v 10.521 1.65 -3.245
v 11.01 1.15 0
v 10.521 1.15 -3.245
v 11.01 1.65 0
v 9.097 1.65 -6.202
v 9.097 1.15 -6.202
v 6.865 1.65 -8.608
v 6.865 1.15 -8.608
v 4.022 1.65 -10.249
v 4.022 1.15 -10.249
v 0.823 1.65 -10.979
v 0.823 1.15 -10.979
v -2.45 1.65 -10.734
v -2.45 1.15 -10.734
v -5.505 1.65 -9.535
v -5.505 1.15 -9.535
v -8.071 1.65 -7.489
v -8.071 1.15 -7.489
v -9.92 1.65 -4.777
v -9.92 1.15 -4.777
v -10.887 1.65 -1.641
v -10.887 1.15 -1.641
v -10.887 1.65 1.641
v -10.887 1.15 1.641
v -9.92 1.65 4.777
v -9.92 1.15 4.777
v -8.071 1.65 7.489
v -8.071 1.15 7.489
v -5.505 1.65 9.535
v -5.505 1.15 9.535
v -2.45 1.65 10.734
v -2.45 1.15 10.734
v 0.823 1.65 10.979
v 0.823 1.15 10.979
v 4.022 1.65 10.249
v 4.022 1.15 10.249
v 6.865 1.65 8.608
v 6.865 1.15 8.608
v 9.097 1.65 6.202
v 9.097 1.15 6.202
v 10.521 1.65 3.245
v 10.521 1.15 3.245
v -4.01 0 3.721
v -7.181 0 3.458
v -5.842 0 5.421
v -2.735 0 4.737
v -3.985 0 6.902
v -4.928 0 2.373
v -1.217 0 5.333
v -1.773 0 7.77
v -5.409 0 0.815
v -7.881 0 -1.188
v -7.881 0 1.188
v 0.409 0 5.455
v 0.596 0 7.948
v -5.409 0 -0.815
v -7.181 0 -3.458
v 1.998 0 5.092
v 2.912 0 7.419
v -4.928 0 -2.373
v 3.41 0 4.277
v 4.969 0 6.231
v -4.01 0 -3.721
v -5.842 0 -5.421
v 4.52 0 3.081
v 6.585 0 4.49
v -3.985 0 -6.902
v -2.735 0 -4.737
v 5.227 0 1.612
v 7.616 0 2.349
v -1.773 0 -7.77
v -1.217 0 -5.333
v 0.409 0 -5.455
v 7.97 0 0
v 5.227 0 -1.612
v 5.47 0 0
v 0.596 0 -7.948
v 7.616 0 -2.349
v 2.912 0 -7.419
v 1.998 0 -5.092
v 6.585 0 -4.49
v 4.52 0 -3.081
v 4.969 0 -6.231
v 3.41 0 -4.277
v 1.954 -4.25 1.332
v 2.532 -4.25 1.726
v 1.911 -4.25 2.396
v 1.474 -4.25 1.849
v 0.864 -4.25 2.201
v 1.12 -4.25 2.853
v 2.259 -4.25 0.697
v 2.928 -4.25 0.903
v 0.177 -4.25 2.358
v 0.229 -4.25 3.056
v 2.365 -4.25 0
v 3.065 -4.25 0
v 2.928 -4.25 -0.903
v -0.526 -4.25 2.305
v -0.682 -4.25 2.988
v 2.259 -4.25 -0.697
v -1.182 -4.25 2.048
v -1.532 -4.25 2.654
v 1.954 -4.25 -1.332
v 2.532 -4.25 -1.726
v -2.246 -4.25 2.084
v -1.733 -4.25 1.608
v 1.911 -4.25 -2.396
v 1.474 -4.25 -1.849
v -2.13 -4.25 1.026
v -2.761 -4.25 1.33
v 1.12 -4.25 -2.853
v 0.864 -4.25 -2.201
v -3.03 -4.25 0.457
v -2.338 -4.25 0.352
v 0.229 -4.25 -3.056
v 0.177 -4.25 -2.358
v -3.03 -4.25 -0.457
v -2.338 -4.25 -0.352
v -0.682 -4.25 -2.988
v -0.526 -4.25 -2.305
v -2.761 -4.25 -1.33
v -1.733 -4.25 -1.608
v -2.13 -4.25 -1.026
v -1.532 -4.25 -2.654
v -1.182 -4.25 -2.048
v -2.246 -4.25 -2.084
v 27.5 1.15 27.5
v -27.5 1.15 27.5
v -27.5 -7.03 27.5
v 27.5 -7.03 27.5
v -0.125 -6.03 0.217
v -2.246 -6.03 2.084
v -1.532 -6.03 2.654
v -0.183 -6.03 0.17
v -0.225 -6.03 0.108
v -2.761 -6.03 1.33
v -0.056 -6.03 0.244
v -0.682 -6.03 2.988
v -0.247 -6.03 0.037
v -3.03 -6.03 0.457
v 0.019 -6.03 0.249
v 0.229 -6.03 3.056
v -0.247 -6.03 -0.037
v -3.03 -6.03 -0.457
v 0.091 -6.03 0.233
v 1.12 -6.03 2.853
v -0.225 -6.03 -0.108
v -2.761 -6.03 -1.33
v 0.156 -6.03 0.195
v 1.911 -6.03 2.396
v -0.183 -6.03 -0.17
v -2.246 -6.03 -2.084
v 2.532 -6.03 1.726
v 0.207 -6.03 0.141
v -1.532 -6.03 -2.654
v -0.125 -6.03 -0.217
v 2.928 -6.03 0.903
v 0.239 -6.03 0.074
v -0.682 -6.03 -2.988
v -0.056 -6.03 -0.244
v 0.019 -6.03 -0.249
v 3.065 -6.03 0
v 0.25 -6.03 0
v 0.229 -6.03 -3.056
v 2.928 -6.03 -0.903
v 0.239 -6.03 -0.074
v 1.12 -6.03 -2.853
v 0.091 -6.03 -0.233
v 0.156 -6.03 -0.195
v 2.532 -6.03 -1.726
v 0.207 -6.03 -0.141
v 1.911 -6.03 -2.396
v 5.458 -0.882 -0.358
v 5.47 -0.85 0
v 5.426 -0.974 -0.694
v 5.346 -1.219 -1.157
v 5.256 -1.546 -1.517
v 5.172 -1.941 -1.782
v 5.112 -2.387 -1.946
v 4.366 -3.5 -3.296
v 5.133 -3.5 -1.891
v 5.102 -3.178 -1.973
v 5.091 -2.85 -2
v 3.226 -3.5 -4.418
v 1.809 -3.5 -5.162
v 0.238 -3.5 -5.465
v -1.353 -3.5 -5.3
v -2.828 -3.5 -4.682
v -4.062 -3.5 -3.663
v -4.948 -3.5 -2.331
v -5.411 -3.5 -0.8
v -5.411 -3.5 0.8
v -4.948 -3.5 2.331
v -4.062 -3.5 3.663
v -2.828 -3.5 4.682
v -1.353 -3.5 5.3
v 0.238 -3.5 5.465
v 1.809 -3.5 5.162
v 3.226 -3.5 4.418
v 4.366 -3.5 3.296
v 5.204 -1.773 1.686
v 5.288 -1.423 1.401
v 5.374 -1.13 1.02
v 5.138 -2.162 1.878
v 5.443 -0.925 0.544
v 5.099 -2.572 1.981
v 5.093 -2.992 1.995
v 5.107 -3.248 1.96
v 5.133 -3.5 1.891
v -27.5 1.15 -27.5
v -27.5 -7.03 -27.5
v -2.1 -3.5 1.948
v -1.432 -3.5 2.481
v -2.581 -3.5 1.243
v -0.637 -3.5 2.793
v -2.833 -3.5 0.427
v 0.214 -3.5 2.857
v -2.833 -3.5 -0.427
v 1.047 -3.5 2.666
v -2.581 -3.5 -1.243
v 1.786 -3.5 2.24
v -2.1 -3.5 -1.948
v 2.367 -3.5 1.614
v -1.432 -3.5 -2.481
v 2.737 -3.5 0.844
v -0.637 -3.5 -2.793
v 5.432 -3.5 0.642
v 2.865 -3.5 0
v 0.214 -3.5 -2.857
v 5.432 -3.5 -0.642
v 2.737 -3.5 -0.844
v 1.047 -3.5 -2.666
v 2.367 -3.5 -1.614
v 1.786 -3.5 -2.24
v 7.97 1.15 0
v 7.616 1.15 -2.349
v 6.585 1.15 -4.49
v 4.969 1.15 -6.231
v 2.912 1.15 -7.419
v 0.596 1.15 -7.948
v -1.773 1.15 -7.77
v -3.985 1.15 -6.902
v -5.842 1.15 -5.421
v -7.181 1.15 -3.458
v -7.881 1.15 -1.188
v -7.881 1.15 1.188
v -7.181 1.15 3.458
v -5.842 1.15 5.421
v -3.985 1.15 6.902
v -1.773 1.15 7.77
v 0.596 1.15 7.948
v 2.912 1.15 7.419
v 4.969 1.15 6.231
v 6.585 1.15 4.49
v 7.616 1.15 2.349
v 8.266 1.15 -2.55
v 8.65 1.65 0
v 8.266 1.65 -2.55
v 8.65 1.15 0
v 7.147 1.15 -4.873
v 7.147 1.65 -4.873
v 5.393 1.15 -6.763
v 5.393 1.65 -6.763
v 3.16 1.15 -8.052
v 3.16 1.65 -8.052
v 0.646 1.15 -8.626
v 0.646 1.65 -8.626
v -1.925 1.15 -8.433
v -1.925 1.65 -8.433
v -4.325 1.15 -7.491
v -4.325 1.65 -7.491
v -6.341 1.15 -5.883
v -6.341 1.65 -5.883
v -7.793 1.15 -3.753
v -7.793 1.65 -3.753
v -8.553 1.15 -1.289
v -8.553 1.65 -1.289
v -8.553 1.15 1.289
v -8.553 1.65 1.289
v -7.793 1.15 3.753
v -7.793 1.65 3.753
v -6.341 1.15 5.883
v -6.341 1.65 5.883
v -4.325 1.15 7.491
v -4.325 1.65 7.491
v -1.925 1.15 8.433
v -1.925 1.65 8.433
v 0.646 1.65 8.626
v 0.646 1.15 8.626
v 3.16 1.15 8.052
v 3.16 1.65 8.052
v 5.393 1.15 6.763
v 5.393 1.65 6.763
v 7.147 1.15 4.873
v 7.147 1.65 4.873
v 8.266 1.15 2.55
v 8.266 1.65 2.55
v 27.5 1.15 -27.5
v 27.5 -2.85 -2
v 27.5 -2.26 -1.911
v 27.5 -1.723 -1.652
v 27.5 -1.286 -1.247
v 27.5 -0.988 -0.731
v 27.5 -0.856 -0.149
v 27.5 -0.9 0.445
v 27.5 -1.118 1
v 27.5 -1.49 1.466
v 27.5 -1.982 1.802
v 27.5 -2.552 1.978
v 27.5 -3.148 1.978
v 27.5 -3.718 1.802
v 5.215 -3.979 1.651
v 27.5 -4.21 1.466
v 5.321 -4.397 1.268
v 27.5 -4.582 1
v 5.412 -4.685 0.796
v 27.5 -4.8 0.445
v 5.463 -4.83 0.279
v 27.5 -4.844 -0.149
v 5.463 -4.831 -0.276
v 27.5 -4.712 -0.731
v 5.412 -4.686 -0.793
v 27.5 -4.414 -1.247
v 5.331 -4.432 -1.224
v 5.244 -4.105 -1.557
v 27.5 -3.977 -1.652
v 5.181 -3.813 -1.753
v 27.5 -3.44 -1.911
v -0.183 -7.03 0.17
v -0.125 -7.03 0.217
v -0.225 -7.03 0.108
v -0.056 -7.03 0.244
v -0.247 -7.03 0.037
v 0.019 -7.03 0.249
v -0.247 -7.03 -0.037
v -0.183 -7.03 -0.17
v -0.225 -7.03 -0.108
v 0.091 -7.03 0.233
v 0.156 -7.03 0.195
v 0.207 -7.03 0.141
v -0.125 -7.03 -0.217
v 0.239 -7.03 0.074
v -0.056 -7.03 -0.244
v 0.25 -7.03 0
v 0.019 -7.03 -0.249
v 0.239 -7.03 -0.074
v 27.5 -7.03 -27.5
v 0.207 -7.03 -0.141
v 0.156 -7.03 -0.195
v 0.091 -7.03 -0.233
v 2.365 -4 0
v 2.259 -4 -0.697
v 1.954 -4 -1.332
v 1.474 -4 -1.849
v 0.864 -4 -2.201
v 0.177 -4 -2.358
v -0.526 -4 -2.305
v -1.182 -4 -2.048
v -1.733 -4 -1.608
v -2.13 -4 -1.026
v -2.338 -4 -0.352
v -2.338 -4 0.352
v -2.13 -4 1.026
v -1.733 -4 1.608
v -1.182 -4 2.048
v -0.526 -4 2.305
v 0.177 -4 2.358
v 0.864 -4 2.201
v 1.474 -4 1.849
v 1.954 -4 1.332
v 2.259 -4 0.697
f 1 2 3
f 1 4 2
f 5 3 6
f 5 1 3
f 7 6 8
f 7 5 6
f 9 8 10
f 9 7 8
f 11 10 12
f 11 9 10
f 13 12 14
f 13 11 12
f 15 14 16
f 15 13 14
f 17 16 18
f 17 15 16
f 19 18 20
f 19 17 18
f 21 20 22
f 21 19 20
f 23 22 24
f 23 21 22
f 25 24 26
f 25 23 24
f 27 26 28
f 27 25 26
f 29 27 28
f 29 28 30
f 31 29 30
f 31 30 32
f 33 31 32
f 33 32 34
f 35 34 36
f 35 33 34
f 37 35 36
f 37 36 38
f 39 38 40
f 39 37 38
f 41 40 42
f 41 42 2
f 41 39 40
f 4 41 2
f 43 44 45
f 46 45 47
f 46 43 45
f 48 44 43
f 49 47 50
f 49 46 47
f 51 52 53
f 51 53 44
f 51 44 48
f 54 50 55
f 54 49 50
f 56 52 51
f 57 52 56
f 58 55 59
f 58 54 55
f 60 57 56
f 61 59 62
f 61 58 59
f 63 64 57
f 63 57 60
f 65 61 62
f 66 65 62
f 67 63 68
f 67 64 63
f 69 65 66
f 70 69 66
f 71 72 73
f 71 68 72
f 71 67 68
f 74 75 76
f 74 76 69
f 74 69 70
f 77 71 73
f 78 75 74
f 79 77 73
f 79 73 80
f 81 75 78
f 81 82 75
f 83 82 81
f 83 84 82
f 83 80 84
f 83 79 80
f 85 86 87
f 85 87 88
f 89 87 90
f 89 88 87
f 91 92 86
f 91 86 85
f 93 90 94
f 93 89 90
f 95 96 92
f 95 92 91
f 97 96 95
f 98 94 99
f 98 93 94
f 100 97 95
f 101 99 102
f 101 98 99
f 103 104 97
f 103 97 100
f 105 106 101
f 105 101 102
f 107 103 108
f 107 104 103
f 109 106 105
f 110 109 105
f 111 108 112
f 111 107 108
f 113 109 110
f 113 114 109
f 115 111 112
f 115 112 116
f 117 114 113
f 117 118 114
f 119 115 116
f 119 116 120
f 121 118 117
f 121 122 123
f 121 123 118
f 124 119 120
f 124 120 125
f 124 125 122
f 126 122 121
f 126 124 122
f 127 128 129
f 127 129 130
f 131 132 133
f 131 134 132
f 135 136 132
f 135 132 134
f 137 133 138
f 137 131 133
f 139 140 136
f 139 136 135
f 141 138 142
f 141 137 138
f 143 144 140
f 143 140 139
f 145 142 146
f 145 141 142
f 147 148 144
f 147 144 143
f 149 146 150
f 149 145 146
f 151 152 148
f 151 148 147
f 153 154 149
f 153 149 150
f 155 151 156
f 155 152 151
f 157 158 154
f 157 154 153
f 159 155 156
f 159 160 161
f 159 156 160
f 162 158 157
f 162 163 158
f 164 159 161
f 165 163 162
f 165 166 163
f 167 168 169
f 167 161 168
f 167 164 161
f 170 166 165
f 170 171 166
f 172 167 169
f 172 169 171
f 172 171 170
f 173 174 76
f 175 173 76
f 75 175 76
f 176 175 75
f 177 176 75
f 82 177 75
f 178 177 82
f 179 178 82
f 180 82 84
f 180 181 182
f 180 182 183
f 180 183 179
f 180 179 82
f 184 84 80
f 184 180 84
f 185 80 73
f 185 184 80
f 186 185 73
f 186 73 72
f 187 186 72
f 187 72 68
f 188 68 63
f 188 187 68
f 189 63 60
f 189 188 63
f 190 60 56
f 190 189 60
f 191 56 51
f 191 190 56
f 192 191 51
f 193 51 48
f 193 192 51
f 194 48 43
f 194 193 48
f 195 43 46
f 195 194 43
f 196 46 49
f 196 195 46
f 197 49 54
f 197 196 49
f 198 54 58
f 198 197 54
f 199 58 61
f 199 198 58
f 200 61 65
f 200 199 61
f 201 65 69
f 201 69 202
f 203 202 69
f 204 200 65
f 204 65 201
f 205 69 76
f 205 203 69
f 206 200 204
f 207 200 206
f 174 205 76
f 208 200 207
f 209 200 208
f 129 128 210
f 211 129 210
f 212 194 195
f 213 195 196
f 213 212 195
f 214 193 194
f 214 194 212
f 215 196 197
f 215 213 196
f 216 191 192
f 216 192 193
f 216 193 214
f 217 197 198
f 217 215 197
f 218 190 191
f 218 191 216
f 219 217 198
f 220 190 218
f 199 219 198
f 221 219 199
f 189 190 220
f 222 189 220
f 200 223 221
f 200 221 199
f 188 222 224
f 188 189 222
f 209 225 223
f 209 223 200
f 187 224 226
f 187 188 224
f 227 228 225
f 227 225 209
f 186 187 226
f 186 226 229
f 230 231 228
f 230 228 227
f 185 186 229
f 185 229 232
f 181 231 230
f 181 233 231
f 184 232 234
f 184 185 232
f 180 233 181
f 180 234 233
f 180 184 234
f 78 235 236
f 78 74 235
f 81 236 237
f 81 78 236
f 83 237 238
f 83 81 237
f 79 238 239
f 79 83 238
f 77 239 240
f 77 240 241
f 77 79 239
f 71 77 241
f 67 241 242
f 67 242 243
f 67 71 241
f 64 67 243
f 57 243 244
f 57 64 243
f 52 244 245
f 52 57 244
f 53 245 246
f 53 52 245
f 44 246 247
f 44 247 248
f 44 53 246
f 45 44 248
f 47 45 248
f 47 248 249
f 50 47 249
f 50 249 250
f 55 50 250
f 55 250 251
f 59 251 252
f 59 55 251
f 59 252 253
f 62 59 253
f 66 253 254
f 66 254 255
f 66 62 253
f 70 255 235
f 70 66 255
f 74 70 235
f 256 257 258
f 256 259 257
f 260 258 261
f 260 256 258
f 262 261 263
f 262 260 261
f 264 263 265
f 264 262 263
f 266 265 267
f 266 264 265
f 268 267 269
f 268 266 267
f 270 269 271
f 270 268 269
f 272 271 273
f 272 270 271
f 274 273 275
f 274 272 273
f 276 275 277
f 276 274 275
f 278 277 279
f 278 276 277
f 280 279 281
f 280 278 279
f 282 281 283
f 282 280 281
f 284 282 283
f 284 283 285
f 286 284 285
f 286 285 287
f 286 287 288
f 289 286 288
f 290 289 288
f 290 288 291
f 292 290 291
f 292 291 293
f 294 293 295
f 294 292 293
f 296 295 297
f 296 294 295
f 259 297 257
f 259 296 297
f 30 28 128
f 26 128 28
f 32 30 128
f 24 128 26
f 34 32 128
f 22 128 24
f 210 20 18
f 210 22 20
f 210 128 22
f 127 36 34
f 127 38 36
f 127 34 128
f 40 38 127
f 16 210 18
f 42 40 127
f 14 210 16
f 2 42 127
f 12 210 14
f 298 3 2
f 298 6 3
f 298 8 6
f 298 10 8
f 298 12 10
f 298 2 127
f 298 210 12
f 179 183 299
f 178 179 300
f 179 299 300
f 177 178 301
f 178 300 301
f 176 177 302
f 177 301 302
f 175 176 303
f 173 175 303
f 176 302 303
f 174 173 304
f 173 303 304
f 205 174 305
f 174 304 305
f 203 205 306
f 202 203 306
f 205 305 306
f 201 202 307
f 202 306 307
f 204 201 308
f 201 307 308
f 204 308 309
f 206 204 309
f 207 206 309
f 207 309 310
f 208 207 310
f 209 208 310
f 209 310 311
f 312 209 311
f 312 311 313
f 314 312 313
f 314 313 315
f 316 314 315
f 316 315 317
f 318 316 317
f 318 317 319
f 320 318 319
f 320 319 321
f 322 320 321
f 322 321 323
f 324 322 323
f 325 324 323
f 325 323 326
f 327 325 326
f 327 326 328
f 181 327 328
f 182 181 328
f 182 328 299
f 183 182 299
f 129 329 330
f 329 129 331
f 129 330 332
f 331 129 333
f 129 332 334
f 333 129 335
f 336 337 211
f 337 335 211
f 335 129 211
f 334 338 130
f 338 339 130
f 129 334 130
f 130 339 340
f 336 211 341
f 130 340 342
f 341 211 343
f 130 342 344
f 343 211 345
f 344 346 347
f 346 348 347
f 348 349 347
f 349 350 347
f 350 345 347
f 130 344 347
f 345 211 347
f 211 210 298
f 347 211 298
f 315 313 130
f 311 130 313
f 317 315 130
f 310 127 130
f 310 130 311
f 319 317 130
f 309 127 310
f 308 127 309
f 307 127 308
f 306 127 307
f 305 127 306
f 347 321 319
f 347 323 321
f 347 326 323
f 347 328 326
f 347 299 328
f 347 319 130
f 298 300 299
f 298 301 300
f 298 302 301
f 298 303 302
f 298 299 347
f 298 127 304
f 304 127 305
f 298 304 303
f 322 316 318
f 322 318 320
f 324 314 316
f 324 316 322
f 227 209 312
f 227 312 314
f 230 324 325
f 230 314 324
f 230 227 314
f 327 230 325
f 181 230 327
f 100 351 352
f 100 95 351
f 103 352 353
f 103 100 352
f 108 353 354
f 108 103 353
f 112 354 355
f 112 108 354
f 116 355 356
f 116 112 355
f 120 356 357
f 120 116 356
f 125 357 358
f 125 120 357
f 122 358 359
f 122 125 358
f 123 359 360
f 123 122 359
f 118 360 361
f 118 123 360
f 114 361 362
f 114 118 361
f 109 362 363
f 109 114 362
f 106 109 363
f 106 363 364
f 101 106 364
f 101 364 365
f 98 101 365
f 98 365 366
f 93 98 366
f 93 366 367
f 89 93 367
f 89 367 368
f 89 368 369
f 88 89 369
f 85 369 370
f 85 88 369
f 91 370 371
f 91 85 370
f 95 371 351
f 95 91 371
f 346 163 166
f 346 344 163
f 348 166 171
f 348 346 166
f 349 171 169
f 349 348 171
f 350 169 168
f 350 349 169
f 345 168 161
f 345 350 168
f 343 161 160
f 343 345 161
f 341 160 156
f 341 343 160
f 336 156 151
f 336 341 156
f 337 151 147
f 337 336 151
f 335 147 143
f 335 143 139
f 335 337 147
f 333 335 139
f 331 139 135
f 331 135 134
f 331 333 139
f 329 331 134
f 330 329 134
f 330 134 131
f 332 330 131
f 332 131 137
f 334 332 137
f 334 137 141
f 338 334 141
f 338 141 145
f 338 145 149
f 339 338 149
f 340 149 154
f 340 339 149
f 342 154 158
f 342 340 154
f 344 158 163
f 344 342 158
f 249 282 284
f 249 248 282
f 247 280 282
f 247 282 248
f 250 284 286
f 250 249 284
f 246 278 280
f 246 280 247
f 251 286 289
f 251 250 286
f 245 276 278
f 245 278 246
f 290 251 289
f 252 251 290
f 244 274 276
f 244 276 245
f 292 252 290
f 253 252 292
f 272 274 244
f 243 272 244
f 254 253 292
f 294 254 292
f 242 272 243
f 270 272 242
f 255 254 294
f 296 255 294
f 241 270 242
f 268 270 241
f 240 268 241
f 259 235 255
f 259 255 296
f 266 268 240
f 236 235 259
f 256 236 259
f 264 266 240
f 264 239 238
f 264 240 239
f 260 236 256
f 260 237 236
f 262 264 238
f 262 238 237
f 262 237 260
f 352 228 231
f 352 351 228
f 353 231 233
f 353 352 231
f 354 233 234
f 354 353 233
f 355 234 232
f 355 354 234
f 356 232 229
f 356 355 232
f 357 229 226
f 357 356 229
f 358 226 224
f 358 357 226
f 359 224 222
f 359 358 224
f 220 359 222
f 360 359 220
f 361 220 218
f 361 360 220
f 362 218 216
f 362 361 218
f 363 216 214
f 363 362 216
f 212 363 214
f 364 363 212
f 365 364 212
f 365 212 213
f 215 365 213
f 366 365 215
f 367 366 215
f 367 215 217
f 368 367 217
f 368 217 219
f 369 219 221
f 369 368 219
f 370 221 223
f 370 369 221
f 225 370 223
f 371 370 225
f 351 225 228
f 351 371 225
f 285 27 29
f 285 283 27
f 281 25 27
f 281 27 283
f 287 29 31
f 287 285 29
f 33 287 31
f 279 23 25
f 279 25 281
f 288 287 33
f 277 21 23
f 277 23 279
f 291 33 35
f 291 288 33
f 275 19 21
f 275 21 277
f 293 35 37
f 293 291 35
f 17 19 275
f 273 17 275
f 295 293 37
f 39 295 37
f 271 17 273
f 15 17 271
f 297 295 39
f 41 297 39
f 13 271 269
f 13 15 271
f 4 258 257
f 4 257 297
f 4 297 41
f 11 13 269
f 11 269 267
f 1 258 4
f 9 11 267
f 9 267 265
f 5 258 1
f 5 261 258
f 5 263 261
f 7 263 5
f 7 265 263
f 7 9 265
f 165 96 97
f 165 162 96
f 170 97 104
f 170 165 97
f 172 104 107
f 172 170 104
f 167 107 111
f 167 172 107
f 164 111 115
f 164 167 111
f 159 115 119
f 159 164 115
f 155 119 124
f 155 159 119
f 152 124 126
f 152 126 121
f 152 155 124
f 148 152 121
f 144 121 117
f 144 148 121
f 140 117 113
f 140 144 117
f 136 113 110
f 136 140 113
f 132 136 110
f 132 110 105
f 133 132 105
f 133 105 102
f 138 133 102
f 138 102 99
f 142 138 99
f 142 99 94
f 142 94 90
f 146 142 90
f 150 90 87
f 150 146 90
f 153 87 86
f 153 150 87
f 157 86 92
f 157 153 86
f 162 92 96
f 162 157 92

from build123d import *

# Parameters (mm, degrees)
SKETCH2_W               = 55
SKETCH2_H               = 55
SKETCH2_R               = 20
BOSS_EXTRUDE1_DEPTH     = 8.18
CUT_EXTRUDE1_REACH      = 63.892
CUT_EXTRUDE1_END_RADIUS = 5.47
SKETCH3_R               = 2


# Read off the part's stored shape, not the designer's step: Revolve2
with BuildPart() as part:
    # Revolve2 outline → Revolve2 (revolve)
    with BuildSketch(Plane.XY):
        Polygon((2.86451, -3.5), (2.36451, -4), (2.36451, -4.25), (3.06451, -4.25), (3.06451, -6.03), (0.25, -6.03), (0.25, -7.03), (20, -7.03), (20, 1.15), (11.01, 1.15), (11.01, 1.65), (8.65, 1.65), (8.65, 1.15), (7.97, 1.15), (7.97, 0), (5.47, 0), (5.47, -3.5), align=None)
    revolve(axis=Axis((0, 0, 0), (0, 1, 0)))

    # Sketch2 → Boss-Extrude1 (add)
    with BuildSketch(Plane(origin=(0, 1.15, 0), x_dir=(1, 0, 0), z_dir=(0, 1, 0))):
        Rectangle(SKETCH2_W, SKETCH2_H)
        Circle(SKETCH2_R, mode=Mode.SUBTRACT)
    extrude(amount=-BOSS_EXTRUDE1_DEPTH)

    # Cut-Extrude1: up to this cylinder (the profile starts outside it)
    cut_extrude1_end = Plane(origin=(0, -2.85, 0), z_dir=(0, 1, 0)) * Cylinder(CUT_EXTRUDE1_END_RADIUS, 139.724, mode=Mode.PRIVATE)
    # Sketch3 → Cut-Extrude1 (cut, up to the surface)
    with BuildSketch(Plane(origin=(27.5, 0, 0), x_dir=(0, 0, -1), z_dir=(1, 0, 0)), mode=Mode.PRIVATE) as cut_extrude1_sk1:
        with Locations((0, -2.85)):
            Circle(SKETCH3_R)
    cut_extrude1_tool1 = extrude(cut_extrude1_sk1.sketch, amount=-CUT_EXTRUDE1_REACH, mode=Mode.PRIVATE) - cut_extrude1_end
    add(cut_extrude1_tool1.solids().sort_by_distance((27.5, -2.85, 0))[0], mode=Mode.SUBTRACT)


solid = part.part
